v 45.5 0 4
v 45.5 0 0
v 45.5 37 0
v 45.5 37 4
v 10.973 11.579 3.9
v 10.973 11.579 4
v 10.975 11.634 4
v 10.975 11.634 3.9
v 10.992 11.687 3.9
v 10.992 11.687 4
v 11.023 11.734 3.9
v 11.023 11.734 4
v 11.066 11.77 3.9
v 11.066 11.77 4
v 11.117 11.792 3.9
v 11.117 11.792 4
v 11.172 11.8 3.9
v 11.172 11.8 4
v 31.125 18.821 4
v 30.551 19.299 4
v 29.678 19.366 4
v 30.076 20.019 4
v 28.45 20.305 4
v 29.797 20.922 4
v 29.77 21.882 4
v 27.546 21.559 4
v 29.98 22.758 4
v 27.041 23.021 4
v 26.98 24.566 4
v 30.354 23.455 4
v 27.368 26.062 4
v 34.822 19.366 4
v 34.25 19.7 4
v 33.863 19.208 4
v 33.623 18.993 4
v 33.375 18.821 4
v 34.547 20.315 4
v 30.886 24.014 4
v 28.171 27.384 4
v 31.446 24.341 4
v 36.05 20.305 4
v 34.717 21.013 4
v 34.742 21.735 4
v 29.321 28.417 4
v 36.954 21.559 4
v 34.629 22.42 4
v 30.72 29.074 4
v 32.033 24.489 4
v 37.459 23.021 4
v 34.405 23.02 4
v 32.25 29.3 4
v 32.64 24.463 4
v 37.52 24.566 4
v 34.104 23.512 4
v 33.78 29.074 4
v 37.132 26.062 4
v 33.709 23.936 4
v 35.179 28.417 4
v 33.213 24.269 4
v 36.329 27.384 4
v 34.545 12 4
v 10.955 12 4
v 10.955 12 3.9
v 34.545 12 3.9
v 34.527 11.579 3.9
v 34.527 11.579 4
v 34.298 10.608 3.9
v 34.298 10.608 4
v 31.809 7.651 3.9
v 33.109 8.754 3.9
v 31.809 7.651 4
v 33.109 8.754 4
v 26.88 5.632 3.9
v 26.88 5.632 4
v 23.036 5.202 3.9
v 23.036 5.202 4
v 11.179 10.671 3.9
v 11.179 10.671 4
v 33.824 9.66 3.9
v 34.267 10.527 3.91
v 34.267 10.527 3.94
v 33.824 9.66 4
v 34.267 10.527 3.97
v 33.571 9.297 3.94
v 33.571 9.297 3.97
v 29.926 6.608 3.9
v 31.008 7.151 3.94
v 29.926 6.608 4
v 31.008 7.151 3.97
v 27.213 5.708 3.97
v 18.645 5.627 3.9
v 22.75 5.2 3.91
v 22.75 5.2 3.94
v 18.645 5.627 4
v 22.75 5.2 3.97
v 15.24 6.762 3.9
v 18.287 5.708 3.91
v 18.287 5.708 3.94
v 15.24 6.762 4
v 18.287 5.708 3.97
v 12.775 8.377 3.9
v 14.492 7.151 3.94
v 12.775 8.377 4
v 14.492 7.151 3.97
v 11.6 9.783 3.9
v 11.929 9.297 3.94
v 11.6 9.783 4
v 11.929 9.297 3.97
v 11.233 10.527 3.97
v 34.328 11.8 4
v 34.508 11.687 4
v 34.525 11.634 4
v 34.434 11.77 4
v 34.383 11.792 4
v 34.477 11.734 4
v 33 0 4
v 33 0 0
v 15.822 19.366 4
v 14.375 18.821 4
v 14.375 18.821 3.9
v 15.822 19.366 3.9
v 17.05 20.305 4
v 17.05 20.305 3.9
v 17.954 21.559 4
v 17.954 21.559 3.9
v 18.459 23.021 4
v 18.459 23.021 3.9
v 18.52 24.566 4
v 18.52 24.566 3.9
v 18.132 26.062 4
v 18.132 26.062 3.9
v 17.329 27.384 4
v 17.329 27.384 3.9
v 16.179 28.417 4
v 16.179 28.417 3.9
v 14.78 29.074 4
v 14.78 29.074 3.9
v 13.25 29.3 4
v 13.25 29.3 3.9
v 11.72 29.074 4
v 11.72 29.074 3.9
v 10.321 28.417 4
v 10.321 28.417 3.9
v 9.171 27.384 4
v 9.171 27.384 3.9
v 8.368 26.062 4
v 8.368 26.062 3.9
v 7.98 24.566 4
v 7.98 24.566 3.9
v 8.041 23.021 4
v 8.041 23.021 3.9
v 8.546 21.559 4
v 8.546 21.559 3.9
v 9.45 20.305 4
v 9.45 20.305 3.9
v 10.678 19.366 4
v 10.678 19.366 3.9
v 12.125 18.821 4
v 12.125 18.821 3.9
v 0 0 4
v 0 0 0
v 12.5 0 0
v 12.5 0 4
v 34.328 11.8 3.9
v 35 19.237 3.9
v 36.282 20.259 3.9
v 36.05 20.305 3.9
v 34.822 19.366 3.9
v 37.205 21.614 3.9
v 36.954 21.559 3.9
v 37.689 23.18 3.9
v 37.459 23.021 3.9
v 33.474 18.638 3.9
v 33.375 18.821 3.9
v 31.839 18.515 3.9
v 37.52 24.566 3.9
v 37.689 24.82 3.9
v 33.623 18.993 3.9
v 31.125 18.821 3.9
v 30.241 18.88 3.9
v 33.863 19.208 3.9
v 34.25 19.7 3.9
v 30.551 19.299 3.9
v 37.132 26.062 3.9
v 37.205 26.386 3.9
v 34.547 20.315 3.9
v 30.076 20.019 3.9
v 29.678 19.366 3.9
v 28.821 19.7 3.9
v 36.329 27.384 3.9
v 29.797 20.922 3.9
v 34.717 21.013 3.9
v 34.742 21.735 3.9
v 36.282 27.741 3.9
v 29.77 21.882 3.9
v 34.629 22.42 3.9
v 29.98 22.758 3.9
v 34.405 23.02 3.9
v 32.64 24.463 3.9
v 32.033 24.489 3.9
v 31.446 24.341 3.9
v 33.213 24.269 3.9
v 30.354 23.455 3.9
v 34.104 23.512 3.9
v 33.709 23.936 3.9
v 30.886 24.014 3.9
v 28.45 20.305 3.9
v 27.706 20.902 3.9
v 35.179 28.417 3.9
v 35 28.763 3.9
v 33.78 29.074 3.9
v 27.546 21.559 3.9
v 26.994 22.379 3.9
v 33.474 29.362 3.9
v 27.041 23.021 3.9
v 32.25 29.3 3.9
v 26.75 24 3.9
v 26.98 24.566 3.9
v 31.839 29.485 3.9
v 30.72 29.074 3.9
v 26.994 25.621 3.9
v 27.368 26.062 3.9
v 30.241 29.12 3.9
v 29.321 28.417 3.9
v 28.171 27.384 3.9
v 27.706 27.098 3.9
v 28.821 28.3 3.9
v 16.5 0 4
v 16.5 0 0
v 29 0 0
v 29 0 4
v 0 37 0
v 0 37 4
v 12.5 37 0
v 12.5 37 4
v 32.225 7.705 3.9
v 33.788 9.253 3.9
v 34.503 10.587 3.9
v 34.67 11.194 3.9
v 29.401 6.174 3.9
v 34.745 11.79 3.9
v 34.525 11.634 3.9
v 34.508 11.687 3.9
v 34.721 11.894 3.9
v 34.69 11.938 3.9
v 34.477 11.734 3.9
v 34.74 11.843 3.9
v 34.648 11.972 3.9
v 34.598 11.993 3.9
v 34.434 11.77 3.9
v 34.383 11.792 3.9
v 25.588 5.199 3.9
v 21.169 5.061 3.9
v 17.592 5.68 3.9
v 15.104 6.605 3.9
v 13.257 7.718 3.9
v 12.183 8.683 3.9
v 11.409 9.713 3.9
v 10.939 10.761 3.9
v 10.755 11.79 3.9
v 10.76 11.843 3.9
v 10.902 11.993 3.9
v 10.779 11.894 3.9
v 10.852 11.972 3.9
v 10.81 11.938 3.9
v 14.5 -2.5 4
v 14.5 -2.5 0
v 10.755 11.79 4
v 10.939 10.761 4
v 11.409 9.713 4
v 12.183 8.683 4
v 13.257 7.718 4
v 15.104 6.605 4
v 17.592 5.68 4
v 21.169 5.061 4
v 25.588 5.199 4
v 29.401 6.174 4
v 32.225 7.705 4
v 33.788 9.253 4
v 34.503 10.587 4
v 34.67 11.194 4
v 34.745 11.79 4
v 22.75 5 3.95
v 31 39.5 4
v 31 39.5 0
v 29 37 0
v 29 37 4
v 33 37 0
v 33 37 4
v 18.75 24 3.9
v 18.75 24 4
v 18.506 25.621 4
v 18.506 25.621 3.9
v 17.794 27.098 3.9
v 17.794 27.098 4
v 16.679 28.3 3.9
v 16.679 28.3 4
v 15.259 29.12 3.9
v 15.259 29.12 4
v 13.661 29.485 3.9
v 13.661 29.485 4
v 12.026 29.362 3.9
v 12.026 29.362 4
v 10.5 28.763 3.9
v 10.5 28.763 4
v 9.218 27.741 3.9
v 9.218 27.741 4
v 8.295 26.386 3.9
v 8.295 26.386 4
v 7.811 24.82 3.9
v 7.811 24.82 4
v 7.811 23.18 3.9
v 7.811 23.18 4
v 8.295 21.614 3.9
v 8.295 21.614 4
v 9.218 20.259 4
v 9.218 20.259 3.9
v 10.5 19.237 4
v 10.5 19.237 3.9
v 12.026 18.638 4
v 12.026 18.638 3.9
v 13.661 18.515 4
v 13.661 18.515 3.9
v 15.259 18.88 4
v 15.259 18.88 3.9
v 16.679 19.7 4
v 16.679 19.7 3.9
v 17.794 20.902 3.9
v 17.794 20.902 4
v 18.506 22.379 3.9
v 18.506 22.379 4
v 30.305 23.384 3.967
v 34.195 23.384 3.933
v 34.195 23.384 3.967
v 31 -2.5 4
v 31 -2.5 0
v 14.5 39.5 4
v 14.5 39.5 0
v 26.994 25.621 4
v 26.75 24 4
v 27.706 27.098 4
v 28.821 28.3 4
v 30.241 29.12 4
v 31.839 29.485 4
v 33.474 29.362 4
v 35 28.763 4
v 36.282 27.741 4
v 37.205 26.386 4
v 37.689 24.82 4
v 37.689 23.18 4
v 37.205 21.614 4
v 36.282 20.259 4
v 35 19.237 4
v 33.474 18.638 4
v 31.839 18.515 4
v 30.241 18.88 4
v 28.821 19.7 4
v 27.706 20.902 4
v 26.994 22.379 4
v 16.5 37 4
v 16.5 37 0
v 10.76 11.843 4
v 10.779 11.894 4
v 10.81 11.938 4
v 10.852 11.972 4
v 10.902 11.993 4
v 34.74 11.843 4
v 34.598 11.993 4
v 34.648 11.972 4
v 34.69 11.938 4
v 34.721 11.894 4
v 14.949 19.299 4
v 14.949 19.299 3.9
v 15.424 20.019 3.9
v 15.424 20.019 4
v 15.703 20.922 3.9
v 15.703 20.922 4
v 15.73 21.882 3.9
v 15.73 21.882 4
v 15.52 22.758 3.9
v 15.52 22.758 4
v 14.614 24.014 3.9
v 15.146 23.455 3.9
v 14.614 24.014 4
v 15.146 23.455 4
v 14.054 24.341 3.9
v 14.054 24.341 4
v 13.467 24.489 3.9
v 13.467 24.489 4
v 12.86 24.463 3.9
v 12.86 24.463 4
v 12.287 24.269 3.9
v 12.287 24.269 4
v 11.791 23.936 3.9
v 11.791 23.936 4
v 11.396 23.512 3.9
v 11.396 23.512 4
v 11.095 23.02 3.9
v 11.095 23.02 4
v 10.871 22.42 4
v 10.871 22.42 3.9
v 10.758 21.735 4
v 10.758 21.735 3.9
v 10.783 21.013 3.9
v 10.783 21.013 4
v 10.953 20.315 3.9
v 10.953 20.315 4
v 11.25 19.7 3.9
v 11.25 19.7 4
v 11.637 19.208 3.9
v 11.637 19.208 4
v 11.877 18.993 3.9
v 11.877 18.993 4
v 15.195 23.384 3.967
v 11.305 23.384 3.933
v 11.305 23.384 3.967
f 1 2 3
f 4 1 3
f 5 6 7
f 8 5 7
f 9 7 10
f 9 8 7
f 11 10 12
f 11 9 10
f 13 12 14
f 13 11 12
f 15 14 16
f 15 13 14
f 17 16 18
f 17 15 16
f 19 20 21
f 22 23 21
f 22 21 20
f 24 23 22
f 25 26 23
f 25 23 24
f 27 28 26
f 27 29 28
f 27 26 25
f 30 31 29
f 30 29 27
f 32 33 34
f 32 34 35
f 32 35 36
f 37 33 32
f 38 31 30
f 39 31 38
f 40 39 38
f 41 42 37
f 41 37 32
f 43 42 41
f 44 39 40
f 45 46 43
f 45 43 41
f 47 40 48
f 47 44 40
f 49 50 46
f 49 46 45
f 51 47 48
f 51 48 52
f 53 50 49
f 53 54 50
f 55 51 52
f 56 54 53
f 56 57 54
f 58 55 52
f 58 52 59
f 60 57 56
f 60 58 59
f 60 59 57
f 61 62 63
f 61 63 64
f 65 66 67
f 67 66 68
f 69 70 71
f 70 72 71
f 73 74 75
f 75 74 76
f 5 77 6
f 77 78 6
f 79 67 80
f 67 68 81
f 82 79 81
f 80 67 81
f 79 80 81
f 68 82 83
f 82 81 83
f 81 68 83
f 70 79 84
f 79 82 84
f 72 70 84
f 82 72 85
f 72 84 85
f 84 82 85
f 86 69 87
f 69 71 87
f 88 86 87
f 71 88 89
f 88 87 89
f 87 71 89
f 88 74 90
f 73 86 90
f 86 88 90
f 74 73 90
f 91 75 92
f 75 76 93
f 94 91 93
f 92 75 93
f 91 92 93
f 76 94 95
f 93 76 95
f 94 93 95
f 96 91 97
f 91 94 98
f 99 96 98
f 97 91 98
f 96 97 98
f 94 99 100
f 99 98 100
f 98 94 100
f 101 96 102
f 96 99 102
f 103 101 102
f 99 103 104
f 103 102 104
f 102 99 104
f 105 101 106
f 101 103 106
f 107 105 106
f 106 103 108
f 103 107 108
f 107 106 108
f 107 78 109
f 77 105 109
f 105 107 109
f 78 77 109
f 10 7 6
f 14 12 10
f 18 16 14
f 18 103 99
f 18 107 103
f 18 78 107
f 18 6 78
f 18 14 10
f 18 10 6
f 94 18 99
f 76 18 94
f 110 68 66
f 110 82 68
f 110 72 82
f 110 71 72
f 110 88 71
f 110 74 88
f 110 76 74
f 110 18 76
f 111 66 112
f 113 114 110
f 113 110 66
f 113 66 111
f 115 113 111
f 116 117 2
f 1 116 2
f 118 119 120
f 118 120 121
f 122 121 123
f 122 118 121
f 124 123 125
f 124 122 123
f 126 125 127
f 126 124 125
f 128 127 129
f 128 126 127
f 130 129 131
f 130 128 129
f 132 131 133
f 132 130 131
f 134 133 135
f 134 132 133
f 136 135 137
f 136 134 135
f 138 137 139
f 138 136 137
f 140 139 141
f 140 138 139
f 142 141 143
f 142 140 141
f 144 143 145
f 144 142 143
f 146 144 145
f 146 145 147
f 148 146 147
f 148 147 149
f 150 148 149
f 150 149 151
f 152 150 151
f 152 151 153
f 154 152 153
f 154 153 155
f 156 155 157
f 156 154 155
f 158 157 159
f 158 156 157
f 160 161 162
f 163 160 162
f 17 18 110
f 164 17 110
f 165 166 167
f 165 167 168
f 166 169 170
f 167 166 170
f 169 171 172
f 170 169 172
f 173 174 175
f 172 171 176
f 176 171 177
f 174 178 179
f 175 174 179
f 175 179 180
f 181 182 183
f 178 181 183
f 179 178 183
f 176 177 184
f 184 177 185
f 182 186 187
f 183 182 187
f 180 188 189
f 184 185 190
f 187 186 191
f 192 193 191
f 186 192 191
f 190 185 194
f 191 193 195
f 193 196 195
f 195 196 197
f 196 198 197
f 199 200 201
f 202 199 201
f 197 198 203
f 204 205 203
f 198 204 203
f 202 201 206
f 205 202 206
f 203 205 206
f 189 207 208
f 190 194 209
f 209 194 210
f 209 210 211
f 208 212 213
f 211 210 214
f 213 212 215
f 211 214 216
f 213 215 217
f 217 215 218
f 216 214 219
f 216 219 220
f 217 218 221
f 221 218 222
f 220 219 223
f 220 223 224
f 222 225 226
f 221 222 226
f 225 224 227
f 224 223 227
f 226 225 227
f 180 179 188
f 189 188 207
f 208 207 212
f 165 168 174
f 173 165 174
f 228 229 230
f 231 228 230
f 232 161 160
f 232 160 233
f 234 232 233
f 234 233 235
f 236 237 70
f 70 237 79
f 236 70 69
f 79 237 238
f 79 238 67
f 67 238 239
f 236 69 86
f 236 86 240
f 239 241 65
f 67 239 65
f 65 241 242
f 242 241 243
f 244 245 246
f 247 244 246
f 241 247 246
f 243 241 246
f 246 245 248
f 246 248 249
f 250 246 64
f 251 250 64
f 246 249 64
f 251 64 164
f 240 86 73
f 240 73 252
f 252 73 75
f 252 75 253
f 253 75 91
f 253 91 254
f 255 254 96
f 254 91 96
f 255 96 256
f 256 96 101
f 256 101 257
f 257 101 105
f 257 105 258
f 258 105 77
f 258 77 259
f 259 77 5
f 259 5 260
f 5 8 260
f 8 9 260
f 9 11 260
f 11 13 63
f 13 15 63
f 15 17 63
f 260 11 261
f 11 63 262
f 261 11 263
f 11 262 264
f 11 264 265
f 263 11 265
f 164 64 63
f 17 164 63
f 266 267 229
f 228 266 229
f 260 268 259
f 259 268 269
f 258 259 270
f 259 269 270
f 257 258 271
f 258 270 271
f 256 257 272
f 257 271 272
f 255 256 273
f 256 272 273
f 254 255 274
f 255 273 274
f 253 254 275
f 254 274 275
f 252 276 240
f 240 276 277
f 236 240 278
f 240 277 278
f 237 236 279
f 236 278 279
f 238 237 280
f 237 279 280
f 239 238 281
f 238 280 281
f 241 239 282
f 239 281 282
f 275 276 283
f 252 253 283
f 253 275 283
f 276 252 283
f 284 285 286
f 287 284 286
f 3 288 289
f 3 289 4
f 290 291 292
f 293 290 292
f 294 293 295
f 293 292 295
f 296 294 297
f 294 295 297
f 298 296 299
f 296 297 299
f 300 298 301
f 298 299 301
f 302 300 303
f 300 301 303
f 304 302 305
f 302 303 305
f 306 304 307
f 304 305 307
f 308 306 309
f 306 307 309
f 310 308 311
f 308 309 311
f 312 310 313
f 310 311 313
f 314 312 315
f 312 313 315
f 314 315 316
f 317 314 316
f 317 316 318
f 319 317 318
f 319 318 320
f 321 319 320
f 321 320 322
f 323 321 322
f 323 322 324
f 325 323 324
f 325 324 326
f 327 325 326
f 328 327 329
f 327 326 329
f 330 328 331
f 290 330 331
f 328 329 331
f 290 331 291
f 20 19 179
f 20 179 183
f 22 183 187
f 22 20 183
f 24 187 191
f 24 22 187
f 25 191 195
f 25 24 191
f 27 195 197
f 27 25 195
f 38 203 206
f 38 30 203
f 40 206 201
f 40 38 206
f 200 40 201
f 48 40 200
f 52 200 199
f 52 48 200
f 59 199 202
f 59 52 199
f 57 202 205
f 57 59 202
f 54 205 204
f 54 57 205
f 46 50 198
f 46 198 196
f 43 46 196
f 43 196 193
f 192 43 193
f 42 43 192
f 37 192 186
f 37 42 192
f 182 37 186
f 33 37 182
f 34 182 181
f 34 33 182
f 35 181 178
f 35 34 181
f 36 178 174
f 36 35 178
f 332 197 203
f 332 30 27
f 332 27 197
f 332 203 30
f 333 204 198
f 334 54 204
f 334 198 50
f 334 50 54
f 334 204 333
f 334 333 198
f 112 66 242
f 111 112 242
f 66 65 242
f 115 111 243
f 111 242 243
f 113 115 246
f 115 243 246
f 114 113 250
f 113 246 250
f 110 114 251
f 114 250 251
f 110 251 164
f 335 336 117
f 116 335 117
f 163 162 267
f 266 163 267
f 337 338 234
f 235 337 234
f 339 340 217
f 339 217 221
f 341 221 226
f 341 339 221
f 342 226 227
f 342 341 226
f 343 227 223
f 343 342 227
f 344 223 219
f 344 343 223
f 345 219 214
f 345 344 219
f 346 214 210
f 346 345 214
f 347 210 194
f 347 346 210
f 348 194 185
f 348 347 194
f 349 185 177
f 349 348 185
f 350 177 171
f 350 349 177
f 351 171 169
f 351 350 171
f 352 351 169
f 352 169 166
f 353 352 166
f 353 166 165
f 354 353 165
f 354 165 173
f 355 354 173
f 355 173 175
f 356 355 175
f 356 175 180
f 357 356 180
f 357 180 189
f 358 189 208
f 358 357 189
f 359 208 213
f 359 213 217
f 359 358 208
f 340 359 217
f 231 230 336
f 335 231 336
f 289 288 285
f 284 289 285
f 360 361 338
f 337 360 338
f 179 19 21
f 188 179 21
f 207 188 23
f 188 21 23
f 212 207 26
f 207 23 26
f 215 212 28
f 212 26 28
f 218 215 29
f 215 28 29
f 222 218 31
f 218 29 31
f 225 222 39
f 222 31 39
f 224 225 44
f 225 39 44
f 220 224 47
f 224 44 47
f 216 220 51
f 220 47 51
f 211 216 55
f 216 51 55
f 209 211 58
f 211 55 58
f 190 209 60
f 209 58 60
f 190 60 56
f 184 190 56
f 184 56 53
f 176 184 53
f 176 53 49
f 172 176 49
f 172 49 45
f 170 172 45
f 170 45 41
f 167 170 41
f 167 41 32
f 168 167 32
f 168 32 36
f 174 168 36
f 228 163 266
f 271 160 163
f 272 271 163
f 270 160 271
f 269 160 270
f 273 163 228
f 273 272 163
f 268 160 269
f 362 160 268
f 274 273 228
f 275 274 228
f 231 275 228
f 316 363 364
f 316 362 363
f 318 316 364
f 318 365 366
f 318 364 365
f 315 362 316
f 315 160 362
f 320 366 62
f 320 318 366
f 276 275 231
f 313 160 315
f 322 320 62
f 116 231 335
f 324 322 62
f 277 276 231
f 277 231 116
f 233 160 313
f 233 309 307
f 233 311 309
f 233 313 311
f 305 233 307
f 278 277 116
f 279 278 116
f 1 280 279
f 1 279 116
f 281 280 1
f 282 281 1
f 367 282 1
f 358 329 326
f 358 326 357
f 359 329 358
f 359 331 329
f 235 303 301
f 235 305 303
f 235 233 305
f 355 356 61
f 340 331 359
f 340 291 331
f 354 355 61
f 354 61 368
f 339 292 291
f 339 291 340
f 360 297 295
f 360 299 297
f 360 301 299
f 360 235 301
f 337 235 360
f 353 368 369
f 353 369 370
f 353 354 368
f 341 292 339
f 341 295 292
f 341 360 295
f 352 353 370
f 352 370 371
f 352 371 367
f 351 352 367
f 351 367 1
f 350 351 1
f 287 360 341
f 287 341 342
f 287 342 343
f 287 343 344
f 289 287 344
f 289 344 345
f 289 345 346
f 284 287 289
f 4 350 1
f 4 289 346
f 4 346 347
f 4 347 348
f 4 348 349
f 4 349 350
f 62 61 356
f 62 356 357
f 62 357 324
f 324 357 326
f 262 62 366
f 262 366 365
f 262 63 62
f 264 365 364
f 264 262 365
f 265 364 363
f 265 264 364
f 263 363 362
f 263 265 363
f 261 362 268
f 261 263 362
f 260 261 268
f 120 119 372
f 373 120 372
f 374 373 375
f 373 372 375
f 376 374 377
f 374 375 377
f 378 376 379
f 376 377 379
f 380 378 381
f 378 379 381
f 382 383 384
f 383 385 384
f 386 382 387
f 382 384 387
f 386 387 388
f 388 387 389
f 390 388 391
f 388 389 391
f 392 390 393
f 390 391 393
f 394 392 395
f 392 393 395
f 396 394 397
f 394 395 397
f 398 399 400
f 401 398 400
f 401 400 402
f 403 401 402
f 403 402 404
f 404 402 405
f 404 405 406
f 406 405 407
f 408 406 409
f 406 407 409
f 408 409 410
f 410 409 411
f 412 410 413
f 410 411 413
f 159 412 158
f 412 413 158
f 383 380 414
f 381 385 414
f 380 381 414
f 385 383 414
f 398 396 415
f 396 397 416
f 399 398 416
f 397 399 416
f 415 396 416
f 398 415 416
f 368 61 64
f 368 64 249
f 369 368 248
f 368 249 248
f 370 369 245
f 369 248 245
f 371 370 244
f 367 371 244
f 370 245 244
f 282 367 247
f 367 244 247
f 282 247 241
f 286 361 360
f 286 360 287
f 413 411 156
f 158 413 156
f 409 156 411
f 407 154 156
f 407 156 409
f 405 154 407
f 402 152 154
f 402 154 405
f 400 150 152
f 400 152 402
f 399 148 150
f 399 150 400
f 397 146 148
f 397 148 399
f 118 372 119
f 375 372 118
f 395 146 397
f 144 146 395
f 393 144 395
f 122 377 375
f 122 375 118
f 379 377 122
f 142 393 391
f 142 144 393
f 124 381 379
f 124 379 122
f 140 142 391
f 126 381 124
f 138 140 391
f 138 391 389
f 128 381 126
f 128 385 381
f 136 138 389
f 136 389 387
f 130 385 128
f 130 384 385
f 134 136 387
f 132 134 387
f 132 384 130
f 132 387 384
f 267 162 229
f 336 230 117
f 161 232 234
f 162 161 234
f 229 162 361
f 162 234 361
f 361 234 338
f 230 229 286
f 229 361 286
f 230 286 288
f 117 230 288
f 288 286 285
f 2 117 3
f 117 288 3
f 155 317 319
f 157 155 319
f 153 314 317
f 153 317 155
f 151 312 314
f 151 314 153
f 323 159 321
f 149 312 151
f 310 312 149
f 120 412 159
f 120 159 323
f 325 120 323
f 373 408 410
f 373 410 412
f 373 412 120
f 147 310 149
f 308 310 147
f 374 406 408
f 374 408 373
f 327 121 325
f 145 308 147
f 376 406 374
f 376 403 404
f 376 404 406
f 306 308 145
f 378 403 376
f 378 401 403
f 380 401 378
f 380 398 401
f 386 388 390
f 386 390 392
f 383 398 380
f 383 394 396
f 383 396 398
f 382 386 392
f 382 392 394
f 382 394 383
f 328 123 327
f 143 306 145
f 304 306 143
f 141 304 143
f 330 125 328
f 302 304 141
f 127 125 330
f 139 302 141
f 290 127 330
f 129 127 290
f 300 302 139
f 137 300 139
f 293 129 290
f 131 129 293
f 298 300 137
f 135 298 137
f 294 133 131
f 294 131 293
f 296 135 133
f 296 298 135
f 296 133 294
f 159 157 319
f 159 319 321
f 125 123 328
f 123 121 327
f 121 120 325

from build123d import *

# Parameters (mm, degrees)
BASIS_DEPTH         = 4
CUT_EXTRUDE10_DEPTH = 0.1
CUT_EXTRUDE14_DEPTH = 0.1
SKETCH10_9_R        = 5.5
SKETCH10_9_R_2      = 5.3
CUT_EXTRUDE16_DEPTH = 0.1
FILLET1_R           = 0.2


with BuildPart() as part:
    # Sketch1 → Basis (new body)
    with BuildSketch(Plane.XY):
        Polygon((0, 37), (0, 0), (12.5, 0), (14.5, -2.5), (16.5, 0), (29, 0), (31, -2.5), (33, 0), (45.5, 0), (45.5, 37), (33, 37), (31, 39.5), (29, 37), (16.5, 37), (14.5, 39.5), (12.5, 37), align=None)
    extrude(amount=BASIS_DEPTH)

    # Sketch10 → Cut-Extrude10 (cut)
    with BuildSketch(Plane.XY.offset(4)):
        with BuildLine():
            Line((34.75, 12), (10.75, 12))
            add(Edge.make_bspline(
                [(10.75, 12), (10.75, 5), (22.75, 5), (34.75, 5), (34.75, 12)],
                knots=[0, 0, 0, 1.570796327, 1.570796327, 3.141592654, 3.141592654, 3.141592654], degree=2, weights=[1, 0.707106781, 1, 0.707106781, 1]))
        make_face()
        with BuildLine():
            add(Edge.make_bspline(
                [(34.544848739, 11.8), (34.522497462, 11.366189062), (34.337619942, 10.522792028), (33.405825268, 8.867470761), (31.220098023, 7.030241966), (27.326621533, 5.547133455), (22.75, 5.026433272), (18.173378467, 5.547133455), (14.279901977, 7.030241966), (12.094174732, 8.867470761), (11.162380058, 10.522792028), (10.977502538, 11.366189062), (10.955151261, 11.8)],
                knots=[3.171638741, 3.171638741, 3.171638741, 3.171638741, 3.364232521, 3.556826301, 3.942013861, 4.32720142, 4.71238898, 5.09757654, 5.4827641, 5.86795166, 6.06054544, 6.25313922, 6.25313922, 6.25313922, 6.25313922], degree=3))
            Line((10.955151261, 11.8), (34.544848739, 11.8))
        make_face(mode=Mode.SUBTRACT)
    extrude(amount=-CUT_EXTRUDE10_DEPTH, mode=Mode.SUBTRACT)

    # Sketch10<6> → Cut-Extrude14 (cut)
    with BuildSketch(Plane.XY.offset(4)):
        with BuildLine():
            ThreePointArc((12.125360528, 18.820696373), (13.25, 18.7), (14.374639472, 18.820696373))
            add(Edge.make_bspline(
                [(14.374639472, 18.820696373), (17.140586708, 20.492548158), (15.195293354, 23.38435682), (13.25, 26.276165482), (11.304706646, 23.38435682), (9.359413292, 20.492548158), (12.125360528, 18.820696373)],
                knots=[0.46660386, 0.46660386, 0.46660386, 2.249929722, 2.249929722, 4.033255585, 4.033255585, 5.816581447, 5.816581447, 5.816581447], degree=2, weights=[1, 0.62811894, 1, 0.62811894, 1, 0.62811894, 1]))
        make_face()
    cut_extrude14 = extrude(amount=-CUT_EXTRUDE14_DEPTH, mode=Mode.SUBTRACT)

    # Sketch10<9> → Cut-Extrude16 (cut)
    with BuildSketch(Plane.XY.offset(4)):
        with Locations((13.25, 24)):
            Circle(SKETCH10_9_R)
        with Locations((13.25, 24)):
            Circle(SKETCH10_9_R_2, mode=Mode.SUBTRACT)
    cut_extrude16 = extrude(amount=-CUT_EXTRUDE16_DEPTH, mode=Mode.SUBTRACT)

    # Mirror1: Cut-Extrude14, Cut-Extrude16 across plane
    add(cut_extrude14.mirror(Plane.ZY.offset(-22.75)), mode=Mode.SUBTRACT)
    add(cut_extrude16.mirror(Plane.ZY.offset(-22.75)), mode=Mode.SUBTRACT)

    # Fillet1
    fillet1_edges = [part.edges().sort_by_distance(p)[0] for p in [
        (34.544848739, 11.8, 3.95),
        (34.75, 12, 3.95),
        (10.955151261, 11.8, 3.95),
        (10.75, 12, 3.95),
    ]]
    fillet(fillet1_edges, radius=FILLET1_R)


solid = part.part
